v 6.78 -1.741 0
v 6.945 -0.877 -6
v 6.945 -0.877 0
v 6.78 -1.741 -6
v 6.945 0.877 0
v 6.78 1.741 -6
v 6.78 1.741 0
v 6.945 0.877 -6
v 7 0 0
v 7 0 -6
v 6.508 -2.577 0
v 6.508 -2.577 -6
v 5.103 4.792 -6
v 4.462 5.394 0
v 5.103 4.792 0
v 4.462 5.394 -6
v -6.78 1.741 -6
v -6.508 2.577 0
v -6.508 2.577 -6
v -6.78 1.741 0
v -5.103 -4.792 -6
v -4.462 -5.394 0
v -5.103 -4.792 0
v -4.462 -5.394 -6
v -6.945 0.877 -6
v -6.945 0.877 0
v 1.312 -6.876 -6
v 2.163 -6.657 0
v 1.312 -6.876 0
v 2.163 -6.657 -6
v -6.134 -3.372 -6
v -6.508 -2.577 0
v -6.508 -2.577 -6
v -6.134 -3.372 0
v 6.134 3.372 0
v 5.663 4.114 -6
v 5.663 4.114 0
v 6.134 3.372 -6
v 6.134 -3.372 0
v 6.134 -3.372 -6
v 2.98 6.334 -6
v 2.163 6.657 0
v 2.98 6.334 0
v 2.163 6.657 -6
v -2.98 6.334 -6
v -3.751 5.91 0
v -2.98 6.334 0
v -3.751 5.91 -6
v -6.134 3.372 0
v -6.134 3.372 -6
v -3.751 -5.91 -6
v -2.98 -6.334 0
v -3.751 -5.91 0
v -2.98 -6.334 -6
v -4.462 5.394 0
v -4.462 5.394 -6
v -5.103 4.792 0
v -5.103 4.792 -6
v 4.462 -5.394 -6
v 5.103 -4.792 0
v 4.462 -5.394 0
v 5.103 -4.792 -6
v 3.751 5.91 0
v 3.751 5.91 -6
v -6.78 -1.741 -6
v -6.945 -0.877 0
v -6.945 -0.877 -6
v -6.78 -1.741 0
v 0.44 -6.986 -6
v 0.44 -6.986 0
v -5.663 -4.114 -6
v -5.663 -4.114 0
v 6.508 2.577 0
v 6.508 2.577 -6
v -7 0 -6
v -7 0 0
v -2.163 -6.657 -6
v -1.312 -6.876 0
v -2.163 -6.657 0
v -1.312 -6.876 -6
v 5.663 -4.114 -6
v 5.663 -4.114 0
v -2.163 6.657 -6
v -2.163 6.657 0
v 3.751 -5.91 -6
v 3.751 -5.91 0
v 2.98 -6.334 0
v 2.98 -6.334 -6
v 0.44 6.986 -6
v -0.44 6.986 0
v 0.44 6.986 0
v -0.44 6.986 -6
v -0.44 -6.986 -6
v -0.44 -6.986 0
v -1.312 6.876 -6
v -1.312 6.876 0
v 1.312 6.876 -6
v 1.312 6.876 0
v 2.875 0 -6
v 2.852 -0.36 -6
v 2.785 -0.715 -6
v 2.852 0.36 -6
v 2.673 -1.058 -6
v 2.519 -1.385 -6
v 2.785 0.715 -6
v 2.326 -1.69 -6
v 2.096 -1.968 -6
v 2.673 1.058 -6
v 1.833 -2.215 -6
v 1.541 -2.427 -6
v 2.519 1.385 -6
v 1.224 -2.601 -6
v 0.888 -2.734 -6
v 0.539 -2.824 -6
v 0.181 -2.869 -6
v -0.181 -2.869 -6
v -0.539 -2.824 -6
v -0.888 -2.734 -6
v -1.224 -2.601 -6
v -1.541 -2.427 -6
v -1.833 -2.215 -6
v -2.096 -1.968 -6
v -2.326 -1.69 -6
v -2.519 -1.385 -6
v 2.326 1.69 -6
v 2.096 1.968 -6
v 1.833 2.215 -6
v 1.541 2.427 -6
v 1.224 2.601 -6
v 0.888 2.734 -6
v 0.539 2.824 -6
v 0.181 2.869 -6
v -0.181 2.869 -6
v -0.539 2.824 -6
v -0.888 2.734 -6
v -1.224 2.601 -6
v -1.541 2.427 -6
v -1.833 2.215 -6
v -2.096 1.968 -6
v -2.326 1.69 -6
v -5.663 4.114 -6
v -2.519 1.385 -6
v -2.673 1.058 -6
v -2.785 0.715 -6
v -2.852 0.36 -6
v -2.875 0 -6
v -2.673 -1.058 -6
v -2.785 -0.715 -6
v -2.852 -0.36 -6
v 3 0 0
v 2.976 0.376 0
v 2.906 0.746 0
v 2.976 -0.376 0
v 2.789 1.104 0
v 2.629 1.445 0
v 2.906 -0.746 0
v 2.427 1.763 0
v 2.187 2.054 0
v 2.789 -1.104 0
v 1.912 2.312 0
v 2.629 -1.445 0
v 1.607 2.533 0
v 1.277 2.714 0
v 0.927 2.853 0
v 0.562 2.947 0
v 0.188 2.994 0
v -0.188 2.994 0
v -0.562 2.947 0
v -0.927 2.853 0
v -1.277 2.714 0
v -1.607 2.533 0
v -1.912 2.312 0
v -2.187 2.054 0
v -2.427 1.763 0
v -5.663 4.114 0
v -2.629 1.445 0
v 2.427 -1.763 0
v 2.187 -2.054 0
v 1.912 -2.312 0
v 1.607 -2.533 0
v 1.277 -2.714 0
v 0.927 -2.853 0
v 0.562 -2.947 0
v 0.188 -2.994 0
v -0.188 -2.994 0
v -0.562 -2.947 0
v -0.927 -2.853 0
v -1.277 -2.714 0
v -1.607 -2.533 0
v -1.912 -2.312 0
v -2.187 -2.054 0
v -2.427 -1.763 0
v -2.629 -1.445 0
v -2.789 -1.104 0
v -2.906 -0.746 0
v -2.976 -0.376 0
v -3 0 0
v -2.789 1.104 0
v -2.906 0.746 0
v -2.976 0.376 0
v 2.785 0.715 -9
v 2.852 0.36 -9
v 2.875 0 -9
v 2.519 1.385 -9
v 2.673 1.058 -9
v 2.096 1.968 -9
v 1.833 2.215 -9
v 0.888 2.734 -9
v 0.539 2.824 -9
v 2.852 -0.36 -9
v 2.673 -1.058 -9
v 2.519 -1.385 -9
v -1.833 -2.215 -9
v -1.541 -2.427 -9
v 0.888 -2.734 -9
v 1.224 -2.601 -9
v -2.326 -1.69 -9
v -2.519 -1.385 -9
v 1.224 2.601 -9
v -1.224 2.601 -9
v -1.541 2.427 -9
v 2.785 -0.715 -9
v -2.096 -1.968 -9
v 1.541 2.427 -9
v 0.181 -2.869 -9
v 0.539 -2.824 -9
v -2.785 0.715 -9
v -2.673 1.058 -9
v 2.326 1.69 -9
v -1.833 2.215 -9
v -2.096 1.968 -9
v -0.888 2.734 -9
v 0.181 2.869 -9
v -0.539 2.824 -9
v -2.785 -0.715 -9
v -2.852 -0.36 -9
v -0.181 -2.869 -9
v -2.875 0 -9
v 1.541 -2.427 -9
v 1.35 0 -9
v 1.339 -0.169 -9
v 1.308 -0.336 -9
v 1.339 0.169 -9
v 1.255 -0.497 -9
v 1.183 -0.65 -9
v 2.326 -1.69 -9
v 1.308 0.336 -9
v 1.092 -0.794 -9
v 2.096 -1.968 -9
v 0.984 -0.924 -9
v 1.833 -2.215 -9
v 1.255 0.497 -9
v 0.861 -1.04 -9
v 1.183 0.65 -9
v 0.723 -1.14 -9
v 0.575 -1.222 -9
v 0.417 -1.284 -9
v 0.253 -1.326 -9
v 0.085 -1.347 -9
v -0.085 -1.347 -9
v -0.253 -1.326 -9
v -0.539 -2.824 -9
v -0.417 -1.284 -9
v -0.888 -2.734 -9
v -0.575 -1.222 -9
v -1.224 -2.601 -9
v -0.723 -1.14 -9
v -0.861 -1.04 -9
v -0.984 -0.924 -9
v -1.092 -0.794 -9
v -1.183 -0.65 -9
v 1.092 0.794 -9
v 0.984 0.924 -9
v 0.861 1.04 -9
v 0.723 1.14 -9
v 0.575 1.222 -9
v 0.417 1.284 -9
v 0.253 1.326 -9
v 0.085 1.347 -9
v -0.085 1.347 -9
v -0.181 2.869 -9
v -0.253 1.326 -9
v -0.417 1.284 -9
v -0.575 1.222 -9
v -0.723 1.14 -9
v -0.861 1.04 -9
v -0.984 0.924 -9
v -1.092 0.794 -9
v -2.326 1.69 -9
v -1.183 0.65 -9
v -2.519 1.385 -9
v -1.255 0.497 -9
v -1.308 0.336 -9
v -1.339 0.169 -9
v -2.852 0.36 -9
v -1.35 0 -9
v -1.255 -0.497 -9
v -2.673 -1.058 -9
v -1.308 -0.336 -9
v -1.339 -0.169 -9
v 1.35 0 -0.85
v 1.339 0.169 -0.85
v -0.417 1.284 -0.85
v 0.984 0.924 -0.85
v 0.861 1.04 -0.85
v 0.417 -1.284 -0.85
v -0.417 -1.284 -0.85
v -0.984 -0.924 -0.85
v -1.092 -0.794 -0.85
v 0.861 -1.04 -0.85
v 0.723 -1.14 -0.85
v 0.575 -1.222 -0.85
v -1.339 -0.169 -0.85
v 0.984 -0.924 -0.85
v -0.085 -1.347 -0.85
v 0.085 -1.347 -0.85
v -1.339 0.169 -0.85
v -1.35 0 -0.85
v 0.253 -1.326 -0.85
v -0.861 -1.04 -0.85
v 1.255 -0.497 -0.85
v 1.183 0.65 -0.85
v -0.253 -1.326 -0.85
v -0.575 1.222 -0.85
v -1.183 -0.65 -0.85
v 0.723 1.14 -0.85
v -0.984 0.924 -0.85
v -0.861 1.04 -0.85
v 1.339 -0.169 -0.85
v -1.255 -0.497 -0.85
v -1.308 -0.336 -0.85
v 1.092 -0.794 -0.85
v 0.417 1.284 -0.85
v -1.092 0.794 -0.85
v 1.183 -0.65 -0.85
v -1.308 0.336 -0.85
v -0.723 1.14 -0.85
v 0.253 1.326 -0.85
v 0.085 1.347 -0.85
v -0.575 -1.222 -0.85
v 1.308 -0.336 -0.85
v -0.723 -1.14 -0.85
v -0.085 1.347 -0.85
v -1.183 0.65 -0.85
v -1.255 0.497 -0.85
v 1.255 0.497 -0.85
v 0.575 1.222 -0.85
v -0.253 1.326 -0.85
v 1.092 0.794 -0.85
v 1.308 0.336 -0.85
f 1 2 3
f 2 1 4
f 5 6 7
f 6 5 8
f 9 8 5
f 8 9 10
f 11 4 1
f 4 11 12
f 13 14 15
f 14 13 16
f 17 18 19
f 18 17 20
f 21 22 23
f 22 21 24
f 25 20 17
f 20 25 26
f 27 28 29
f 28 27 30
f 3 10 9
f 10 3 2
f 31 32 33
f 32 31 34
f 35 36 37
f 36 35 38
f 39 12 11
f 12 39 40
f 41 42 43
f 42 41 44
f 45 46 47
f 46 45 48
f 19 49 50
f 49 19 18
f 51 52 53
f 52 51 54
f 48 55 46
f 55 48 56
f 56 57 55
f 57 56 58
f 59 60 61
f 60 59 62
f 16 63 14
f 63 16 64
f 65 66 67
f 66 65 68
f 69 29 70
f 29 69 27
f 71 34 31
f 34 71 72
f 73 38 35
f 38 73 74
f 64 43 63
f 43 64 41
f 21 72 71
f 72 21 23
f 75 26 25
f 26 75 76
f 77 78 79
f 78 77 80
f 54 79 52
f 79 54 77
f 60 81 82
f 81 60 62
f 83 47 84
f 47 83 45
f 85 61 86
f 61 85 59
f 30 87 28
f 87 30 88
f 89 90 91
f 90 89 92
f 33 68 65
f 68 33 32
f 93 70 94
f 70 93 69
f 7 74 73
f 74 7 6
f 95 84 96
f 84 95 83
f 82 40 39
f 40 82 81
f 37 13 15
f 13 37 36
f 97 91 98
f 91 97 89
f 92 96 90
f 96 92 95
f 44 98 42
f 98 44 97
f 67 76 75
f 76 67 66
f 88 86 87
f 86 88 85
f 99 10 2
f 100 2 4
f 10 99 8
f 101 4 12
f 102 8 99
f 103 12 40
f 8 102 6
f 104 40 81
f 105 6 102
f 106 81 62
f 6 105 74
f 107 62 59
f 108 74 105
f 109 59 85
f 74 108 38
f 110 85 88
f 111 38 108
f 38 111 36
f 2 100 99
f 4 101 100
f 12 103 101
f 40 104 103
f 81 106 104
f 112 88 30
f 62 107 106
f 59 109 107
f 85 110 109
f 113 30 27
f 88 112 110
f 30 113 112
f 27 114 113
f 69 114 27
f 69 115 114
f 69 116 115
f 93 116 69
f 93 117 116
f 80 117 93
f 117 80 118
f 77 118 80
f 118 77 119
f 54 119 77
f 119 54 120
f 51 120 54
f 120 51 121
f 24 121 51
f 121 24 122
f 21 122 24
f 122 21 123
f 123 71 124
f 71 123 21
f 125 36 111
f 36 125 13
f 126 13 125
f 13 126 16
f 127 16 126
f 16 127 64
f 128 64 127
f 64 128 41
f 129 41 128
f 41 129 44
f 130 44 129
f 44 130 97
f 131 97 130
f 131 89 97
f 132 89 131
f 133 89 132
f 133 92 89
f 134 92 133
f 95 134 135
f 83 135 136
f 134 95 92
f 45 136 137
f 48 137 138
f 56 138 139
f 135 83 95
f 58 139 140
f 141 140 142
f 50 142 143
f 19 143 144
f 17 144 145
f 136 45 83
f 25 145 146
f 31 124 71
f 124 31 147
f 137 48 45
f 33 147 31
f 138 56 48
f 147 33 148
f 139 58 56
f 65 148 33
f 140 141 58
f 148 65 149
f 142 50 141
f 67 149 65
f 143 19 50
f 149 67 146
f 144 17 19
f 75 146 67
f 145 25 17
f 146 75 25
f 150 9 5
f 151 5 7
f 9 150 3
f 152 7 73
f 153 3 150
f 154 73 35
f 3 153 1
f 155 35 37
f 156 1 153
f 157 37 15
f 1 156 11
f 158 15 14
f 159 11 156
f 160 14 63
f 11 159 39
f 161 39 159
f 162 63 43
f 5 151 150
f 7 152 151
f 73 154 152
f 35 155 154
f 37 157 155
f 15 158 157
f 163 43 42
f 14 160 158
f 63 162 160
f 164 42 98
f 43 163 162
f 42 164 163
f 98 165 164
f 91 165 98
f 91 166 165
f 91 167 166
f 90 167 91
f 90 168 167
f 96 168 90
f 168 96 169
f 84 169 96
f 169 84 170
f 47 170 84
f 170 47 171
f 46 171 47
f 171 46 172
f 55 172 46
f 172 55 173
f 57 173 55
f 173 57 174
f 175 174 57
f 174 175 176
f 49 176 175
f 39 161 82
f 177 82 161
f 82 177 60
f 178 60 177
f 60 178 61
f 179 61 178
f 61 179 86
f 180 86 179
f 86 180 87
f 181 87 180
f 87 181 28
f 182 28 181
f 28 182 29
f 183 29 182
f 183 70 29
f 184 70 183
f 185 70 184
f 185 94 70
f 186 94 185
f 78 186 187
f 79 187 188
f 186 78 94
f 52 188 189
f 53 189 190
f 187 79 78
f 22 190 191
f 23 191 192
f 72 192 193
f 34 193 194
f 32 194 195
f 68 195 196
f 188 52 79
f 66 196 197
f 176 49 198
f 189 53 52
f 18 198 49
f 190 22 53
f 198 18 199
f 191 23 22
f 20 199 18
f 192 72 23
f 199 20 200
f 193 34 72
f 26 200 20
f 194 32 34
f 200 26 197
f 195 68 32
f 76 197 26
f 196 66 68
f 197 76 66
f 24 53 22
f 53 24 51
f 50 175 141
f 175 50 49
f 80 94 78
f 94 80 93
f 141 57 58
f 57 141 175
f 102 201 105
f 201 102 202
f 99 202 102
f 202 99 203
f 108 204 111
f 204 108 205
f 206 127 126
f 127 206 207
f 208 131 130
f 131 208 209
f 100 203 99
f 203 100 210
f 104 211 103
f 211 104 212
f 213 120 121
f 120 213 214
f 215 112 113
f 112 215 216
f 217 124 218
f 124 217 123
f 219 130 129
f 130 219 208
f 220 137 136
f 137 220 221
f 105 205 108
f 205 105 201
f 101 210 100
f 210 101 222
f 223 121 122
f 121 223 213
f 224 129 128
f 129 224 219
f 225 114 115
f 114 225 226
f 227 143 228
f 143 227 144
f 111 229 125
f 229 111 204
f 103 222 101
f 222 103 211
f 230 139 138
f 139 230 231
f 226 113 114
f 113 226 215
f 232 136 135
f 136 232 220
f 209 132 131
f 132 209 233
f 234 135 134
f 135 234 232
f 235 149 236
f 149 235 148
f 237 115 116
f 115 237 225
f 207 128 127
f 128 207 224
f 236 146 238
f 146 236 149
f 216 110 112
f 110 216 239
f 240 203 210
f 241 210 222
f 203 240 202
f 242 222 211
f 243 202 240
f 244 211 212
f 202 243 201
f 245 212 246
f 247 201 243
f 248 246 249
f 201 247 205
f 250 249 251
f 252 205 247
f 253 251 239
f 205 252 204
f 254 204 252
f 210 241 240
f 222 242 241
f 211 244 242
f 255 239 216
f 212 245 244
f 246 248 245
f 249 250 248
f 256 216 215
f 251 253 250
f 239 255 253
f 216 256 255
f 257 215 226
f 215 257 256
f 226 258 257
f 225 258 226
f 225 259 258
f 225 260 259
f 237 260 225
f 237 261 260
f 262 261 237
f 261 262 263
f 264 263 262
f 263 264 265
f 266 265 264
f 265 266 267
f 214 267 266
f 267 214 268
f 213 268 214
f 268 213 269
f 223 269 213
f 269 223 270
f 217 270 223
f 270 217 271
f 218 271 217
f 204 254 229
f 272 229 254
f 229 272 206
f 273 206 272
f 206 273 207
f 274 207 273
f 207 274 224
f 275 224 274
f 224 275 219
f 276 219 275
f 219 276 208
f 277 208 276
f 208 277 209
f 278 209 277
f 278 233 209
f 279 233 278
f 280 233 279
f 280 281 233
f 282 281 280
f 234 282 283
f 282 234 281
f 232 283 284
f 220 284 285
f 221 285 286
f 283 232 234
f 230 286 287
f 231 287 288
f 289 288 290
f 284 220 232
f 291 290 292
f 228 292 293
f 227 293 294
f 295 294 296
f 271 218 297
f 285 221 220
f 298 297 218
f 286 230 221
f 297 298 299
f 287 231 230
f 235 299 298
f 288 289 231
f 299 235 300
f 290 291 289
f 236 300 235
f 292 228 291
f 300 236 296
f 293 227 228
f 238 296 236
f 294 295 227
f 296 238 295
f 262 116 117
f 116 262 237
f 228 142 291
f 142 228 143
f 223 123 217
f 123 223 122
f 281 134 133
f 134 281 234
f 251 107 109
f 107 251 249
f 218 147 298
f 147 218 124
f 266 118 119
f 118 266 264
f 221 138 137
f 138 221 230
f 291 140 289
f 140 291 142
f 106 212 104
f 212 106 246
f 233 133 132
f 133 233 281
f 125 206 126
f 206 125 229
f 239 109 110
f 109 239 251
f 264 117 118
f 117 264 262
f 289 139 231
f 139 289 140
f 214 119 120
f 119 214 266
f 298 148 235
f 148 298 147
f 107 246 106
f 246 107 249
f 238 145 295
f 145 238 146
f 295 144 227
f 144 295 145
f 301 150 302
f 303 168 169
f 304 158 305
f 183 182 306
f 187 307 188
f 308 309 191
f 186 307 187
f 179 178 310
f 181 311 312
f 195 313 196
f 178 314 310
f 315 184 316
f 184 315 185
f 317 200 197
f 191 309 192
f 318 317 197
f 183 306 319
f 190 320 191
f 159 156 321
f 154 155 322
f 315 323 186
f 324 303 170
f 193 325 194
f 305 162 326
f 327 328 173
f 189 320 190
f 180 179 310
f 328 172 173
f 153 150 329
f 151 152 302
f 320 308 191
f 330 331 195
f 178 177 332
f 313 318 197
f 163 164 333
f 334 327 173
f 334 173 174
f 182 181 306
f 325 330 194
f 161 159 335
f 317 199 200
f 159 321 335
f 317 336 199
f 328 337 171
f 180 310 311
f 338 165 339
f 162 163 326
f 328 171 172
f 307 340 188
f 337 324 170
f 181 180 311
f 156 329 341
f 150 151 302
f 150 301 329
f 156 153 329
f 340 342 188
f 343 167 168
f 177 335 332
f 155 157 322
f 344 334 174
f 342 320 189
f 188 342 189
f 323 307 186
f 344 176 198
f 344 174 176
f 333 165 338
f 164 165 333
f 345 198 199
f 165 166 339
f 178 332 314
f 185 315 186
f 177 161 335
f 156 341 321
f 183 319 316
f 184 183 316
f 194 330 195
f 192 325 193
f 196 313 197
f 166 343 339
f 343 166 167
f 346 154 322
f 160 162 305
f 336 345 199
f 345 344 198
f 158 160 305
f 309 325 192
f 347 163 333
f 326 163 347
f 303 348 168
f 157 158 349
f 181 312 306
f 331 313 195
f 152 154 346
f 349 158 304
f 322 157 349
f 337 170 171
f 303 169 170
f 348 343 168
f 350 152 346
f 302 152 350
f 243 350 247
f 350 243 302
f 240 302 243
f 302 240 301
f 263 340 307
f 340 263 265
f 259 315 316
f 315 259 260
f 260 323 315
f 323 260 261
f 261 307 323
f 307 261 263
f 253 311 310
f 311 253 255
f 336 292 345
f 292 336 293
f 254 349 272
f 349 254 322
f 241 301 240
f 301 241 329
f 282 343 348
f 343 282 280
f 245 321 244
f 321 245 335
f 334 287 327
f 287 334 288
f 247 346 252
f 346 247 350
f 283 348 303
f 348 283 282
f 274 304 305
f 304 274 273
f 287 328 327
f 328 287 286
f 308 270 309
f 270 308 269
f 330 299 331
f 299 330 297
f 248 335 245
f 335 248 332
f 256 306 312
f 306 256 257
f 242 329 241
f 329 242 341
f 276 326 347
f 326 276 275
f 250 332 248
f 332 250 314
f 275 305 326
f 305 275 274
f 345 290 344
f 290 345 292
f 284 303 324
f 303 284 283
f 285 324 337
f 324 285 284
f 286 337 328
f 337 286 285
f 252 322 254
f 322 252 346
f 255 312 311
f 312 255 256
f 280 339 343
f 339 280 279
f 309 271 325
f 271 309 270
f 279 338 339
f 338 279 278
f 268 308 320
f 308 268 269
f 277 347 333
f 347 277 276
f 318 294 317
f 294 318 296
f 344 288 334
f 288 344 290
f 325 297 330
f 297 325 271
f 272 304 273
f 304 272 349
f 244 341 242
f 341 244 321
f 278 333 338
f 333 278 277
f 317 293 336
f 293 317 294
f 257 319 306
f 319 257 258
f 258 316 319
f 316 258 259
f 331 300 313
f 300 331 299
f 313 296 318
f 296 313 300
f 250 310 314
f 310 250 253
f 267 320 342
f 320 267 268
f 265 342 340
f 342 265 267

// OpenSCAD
$fn = 50;

difference() {
	union() {
		translate(v = [0, 0, -6.0]) {
			cylinder(h = 6, r = 7.0);
		}
		#translate(v = [0, 0, -9.0]) {
			cylinder(h = 9, r = 2.875);
		}
	}
	union() {
		translate(v = [0, 0, 0]) {
			rotate(a = [0, 0, 0]) {
				difference() {
					union() {
						translate(v = [0, 0, -9.0]) {
							cylinder(h = 9, r = 1.0);
						}
						translate(v = [0, 0, -0.85]) {
							cylinder(h = 0.85, r1 = 1.35, r2 = 3.0);
						}
						translate(v = [0, 0, -9.0]) {
							cylinder(h = 9, r = 1.35);
						}
						translate(v = [0, 0, -9.0]) {
							cylinder(h = 9, r = 1.0);
						}
					}
					union();
				}
			}
		}
	}
}
